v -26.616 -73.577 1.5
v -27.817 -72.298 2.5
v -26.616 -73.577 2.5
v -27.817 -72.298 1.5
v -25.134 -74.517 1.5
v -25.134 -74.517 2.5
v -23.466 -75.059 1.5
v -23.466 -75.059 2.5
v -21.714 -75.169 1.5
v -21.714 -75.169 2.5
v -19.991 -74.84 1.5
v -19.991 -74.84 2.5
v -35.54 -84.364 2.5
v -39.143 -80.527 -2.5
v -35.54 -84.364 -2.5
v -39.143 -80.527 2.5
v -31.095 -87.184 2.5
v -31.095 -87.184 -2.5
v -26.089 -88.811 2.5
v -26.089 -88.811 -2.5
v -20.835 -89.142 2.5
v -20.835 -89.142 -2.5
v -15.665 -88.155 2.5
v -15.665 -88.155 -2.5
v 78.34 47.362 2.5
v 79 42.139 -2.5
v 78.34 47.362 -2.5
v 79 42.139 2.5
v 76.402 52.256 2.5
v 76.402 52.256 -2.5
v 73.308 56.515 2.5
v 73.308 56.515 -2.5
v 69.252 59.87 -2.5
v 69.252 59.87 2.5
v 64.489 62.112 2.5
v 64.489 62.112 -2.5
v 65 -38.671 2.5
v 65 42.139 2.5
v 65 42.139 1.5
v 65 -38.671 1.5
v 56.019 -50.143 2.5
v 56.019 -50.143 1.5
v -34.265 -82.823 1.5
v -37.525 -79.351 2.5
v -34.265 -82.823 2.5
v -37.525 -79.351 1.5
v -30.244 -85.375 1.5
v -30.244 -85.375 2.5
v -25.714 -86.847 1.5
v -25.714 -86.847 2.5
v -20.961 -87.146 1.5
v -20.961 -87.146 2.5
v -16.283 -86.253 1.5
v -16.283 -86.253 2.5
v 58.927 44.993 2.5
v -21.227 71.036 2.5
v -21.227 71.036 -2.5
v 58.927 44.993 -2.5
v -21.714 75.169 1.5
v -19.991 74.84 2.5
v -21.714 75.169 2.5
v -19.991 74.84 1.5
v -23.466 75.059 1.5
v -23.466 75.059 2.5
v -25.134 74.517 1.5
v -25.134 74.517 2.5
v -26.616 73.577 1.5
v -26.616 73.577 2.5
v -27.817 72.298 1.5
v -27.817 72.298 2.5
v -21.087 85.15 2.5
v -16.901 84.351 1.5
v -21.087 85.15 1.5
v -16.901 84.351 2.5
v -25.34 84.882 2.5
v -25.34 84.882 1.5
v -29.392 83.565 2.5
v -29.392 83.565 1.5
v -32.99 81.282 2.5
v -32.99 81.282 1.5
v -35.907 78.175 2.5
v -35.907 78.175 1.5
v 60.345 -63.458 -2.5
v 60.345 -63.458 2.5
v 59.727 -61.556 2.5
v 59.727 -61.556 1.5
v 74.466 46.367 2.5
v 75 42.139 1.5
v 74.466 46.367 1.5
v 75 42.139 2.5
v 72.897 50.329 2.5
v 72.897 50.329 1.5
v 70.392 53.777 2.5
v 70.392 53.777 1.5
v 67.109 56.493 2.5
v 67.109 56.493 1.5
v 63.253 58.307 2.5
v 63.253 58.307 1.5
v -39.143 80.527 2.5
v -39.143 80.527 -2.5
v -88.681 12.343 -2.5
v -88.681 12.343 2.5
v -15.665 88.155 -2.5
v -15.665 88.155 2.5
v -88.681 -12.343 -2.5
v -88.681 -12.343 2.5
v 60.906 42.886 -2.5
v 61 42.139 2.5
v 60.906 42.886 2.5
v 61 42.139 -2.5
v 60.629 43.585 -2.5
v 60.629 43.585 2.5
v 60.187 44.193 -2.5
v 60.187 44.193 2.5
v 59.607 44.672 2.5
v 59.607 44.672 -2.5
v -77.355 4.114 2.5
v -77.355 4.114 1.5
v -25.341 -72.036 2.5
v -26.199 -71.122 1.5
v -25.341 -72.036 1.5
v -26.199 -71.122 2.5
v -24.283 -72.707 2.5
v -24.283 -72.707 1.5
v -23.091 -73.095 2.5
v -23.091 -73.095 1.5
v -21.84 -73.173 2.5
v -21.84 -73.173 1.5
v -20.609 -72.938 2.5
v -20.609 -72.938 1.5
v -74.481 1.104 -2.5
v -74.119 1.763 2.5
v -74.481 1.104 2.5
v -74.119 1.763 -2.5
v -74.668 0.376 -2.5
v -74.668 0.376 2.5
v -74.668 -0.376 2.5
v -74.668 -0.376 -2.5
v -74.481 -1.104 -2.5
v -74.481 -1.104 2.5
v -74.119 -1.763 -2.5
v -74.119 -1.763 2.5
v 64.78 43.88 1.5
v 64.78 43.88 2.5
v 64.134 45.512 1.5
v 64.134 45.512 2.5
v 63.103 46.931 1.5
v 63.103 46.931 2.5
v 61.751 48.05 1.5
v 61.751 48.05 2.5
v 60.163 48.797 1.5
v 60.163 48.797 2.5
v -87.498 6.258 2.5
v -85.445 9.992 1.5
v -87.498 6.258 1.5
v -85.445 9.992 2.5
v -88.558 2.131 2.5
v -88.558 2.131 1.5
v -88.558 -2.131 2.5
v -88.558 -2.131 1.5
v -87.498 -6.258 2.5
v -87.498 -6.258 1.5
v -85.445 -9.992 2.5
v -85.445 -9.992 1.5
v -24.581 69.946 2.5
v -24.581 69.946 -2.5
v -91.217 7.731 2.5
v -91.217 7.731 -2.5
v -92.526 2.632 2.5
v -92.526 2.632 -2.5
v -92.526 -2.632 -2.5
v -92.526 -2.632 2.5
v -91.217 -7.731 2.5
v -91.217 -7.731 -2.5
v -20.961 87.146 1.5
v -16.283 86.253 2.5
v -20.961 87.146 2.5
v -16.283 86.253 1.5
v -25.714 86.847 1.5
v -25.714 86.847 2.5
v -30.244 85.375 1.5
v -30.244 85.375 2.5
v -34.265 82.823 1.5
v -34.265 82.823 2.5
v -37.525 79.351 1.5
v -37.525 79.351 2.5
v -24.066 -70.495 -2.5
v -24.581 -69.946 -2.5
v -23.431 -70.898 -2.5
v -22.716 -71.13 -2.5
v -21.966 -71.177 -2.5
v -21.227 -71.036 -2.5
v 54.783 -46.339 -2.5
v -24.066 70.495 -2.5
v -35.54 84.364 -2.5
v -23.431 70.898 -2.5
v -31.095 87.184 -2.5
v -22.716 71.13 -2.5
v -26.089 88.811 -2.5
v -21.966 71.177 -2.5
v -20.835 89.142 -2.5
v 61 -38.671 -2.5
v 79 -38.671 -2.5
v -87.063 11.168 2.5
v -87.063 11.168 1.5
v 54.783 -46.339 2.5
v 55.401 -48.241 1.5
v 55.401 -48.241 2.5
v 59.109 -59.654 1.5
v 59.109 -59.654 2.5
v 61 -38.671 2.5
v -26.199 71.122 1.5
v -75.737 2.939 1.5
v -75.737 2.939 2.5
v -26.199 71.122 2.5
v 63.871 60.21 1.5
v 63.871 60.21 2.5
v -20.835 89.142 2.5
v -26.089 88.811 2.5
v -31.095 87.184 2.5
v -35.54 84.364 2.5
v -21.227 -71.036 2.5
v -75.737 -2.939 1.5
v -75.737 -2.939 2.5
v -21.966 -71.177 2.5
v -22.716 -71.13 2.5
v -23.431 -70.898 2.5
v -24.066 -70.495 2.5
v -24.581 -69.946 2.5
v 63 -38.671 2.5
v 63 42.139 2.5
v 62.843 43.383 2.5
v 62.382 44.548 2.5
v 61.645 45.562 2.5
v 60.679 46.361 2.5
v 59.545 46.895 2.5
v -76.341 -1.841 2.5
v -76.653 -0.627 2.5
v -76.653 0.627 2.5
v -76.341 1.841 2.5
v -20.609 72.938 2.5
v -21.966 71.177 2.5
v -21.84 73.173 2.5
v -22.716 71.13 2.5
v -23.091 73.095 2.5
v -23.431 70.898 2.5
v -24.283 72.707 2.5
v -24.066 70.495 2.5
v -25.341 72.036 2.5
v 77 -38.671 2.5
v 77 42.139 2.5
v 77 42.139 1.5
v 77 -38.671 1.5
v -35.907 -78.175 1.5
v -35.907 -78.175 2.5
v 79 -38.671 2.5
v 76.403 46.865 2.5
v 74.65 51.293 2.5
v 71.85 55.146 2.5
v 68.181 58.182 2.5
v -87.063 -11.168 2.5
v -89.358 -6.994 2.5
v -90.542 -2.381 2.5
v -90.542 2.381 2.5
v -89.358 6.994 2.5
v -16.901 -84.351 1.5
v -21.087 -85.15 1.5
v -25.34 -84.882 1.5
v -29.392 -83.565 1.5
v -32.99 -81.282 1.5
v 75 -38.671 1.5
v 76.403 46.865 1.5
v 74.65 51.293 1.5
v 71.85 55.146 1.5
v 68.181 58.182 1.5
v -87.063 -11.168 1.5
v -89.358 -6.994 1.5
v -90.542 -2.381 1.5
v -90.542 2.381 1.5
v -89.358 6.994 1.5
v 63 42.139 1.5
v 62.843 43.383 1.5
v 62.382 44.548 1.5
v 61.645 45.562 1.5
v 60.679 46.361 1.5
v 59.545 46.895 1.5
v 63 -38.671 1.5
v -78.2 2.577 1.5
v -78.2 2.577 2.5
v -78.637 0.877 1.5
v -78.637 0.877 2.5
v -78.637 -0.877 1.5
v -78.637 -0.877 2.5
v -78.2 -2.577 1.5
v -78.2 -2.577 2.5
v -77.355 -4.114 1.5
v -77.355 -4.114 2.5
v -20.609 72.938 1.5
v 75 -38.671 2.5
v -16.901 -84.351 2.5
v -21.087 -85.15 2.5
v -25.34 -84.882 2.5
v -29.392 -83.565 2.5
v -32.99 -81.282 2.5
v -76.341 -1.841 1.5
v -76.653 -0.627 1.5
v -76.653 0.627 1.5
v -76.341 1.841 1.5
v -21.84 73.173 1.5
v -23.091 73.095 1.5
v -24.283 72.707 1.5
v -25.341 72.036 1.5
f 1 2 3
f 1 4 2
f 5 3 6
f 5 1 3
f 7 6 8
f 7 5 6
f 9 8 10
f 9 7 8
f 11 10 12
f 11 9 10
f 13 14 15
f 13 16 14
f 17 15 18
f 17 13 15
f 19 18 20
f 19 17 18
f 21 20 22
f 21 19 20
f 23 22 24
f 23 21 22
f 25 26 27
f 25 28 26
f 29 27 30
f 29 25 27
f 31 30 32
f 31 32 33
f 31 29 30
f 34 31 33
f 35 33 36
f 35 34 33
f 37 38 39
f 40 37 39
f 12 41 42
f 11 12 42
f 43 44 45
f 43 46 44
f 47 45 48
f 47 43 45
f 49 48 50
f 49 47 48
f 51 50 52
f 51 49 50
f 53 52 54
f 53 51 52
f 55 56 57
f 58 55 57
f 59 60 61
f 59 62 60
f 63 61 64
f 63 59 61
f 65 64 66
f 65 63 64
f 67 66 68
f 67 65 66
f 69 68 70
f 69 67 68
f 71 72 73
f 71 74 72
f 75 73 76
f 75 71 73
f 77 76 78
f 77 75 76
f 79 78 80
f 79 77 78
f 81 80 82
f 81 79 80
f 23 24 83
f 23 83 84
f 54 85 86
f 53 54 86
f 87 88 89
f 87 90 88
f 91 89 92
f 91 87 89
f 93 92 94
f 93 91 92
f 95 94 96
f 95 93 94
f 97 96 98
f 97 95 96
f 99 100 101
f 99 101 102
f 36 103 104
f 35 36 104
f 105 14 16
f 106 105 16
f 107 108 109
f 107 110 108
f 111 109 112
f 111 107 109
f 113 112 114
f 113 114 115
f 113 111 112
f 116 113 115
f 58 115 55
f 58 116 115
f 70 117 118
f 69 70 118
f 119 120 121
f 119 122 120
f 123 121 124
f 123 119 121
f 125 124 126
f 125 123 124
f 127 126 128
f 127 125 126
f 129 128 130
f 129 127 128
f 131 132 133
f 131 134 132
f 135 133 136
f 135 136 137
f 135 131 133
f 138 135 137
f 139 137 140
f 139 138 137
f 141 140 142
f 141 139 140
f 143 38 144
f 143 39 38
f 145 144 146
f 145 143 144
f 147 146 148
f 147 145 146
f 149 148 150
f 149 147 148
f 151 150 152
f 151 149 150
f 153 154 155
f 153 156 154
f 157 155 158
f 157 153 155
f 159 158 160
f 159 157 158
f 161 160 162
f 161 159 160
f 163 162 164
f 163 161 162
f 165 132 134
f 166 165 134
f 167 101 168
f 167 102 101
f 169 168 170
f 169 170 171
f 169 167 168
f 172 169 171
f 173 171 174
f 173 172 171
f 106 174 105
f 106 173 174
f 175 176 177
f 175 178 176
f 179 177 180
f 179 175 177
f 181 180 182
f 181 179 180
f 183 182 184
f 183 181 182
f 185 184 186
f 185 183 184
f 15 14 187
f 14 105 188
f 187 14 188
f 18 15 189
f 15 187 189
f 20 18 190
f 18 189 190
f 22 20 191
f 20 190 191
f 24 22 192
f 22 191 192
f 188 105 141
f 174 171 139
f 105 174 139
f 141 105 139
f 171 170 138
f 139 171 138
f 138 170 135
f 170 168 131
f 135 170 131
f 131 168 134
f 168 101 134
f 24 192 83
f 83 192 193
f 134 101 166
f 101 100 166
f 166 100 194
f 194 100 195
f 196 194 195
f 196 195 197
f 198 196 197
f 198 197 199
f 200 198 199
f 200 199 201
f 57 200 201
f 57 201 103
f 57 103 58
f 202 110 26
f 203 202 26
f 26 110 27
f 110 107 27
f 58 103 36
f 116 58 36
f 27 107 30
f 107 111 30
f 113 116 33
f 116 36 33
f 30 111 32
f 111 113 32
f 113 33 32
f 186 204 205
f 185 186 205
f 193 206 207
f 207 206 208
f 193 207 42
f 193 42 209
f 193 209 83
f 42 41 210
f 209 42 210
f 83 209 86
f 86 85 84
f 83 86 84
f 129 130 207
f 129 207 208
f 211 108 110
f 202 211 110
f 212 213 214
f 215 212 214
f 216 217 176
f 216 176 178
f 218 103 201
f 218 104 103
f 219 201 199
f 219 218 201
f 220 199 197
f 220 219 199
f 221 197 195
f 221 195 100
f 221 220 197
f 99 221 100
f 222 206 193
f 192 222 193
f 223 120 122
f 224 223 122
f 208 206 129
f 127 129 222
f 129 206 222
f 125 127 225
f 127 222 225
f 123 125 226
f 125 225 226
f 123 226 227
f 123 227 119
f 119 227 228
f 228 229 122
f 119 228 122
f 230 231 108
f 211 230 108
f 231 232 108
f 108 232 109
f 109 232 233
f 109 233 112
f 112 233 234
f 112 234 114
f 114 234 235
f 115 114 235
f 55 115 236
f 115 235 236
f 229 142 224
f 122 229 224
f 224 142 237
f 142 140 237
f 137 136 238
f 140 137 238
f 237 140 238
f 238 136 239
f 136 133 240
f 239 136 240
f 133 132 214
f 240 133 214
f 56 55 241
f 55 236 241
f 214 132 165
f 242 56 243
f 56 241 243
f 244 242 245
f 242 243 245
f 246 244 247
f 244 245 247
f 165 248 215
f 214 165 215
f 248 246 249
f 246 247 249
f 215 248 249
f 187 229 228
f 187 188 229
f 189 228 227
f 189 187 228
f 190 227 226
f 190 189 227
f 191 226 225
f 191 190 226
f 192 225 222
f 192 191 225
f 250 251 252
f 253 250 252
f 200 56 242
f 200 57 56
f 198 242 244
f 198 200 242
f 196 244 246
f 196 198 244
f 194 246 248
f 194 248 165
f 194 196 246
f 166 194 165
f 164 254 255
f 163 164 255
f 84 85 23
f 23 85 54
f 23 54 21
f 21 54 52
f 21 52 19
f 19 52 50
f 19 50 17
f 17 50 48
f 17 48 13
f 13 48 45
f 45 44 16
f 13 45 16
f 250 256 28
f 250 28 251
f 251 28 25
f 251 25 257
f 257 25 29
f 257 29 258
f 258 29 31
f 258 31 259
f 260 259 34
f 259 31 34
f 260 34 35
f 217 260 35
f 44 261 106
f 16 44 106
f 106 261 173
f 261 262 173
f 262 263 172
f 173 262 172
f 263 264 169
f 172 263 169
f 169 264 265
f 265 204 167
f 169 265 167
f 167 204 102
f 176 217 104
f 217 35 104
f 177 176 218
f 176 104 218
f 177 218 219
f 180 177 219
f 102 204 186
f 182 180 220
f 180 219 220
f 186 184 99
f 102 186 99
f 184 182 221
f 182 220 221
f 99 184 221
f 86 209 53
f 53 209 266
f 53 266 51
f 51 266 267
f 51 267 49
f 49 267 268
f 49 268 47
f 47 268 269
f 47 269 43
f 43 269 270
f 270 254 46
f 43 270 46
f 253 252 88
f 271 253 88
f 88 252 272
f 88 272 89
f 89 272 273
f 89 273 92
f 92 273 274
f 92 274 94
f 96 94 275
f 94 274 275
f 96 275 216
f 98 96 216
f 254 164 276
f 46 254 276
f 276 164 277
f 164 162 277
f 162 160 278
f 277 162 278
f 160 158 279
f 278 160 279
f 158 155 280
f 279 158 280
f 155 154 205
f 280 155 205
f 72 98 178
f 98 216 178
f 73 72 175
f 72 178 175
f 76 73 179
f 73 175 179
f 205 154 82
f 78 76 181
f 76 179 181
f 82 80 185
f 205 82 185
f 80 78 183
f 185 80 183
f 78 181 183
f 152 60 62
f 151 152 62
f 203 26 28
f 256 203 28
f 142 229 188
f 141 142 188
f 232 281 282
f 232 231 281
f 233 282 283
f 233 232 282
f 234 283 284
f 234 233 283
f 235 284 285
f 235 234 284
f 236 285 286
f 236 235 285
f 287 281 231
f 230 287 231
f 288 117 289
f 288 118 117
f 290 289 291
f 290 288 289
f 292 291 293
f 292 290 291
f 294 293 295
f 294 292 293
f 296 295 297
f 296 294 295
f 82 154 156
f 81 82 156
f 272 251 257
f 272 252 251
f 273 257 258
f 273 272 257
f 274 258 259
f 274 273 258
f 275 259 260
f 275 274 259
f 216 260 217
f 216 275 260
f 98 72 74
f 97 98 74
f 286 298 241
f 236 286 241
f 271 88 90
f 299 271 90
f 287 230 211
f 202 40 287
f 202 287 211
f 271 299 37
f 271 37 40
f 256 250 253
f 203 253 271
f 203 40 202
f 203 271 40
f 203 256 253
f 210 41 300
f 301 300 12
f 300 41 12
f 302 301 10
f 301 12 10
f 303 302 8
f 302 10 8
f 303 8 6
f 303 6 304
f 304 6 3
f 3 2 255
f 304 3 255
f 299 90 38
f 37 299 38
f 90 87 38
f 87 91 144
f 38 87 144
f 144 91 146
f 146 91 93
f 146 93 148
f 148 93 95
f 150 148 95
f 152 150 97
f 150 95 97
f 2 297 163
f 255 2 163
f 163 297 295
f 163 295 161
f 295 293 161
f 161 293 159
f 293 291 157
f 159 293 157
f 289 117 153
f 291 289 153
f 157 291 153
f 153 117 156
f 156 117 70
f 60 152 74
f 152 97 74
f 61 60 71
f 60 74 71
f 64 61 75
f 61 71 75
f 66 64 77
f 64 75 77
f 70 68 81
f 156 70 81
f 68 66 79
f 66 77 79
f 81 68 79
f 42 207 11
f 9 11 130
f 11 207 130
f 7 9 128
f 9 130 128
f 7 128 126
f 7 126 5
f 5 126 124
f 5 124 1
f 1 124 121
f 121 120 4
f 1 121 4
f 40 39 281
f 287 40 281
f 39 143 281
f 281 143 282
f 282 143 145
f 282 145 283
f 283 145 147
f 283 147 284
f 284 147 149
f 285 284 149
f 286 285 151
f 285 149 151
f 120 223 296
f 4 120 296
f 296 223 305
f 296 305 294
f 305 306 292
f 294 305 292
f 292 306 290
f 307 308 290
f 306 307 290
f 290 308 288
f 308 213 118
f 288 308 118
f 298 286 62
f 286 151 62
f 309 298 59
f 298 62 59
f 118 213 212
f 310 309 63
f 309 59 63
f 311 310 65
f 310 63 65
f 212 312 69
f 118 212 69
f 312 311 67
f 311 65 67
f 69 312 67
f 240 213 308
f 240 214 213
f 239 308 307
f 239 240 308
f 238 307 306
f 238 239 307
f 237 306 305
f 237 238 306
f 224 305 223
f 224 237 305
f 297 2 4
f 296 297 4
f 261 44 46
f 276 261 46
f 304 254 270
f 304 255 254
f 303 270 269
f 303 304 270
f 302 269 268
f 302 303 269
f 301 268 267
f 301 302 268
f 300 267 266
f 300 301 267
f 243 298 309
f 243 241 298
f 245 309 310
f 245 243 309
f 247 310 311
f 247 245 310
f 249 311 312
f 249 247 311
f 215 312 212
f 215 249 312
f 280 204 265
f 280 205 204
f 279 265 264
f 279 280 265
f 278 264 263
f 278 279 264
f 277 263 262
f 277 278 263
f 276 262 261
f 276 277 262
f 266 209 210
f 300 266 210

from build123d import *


with BuildPart() as f2:
    # F2: sweep along a path in F0
    with BuildLine(Plane.XY) as f2_path:
        Line((70, -38.6713670124), (70, 42.1394666243))
        ThreePointArc((70, 42.1394666243), (67.7082039325, 49.1928896518), (61.7082039325, 53.5521448199))
        Line((61.7082039325, 53.5521448199), (-18.44582472, 79.5957674615))
        ThreePointArc((-18.44582472, 79.5957674615), (-25.862232585, 79.5957674615), (-31.862232585, 75.2365122934))
        Line((-31.862232585, 75.2365122934), (-81.4001466275, 7.0534230275))
        ThreePointArc((-81.4001466275, 7.0534230275), (-83.691942695, 0), (-81.4001466275, -7.0534230275))
        Line((-81.4001466275, -7.0534230275), (-31.862232585, -75.2365122934))
        ThreePointArc((-31.862232585, -75.2365122934), (-25.862232585, -79.5957674615), (-18.44582472, -79.5957674615))
        Line((-18.44582472, -79.5957674615), (57.5640973422, -54.8986466743))
    # F1 (on Front) → F2 (sweep)
    with BuildSketch(Plane.XZ):
        Polygon((61, -2.5), (79, -2.5), (79, 2.5), (77, 2.5), (77, 1.5), (75, 1.5), (75, 2.5), (65, 2.5), (65, 1.5), (63, 1.5), (63, 2.5), (61, 2.5), align=None)
    sweep(path=f2_path.line)


solid = f2.part
